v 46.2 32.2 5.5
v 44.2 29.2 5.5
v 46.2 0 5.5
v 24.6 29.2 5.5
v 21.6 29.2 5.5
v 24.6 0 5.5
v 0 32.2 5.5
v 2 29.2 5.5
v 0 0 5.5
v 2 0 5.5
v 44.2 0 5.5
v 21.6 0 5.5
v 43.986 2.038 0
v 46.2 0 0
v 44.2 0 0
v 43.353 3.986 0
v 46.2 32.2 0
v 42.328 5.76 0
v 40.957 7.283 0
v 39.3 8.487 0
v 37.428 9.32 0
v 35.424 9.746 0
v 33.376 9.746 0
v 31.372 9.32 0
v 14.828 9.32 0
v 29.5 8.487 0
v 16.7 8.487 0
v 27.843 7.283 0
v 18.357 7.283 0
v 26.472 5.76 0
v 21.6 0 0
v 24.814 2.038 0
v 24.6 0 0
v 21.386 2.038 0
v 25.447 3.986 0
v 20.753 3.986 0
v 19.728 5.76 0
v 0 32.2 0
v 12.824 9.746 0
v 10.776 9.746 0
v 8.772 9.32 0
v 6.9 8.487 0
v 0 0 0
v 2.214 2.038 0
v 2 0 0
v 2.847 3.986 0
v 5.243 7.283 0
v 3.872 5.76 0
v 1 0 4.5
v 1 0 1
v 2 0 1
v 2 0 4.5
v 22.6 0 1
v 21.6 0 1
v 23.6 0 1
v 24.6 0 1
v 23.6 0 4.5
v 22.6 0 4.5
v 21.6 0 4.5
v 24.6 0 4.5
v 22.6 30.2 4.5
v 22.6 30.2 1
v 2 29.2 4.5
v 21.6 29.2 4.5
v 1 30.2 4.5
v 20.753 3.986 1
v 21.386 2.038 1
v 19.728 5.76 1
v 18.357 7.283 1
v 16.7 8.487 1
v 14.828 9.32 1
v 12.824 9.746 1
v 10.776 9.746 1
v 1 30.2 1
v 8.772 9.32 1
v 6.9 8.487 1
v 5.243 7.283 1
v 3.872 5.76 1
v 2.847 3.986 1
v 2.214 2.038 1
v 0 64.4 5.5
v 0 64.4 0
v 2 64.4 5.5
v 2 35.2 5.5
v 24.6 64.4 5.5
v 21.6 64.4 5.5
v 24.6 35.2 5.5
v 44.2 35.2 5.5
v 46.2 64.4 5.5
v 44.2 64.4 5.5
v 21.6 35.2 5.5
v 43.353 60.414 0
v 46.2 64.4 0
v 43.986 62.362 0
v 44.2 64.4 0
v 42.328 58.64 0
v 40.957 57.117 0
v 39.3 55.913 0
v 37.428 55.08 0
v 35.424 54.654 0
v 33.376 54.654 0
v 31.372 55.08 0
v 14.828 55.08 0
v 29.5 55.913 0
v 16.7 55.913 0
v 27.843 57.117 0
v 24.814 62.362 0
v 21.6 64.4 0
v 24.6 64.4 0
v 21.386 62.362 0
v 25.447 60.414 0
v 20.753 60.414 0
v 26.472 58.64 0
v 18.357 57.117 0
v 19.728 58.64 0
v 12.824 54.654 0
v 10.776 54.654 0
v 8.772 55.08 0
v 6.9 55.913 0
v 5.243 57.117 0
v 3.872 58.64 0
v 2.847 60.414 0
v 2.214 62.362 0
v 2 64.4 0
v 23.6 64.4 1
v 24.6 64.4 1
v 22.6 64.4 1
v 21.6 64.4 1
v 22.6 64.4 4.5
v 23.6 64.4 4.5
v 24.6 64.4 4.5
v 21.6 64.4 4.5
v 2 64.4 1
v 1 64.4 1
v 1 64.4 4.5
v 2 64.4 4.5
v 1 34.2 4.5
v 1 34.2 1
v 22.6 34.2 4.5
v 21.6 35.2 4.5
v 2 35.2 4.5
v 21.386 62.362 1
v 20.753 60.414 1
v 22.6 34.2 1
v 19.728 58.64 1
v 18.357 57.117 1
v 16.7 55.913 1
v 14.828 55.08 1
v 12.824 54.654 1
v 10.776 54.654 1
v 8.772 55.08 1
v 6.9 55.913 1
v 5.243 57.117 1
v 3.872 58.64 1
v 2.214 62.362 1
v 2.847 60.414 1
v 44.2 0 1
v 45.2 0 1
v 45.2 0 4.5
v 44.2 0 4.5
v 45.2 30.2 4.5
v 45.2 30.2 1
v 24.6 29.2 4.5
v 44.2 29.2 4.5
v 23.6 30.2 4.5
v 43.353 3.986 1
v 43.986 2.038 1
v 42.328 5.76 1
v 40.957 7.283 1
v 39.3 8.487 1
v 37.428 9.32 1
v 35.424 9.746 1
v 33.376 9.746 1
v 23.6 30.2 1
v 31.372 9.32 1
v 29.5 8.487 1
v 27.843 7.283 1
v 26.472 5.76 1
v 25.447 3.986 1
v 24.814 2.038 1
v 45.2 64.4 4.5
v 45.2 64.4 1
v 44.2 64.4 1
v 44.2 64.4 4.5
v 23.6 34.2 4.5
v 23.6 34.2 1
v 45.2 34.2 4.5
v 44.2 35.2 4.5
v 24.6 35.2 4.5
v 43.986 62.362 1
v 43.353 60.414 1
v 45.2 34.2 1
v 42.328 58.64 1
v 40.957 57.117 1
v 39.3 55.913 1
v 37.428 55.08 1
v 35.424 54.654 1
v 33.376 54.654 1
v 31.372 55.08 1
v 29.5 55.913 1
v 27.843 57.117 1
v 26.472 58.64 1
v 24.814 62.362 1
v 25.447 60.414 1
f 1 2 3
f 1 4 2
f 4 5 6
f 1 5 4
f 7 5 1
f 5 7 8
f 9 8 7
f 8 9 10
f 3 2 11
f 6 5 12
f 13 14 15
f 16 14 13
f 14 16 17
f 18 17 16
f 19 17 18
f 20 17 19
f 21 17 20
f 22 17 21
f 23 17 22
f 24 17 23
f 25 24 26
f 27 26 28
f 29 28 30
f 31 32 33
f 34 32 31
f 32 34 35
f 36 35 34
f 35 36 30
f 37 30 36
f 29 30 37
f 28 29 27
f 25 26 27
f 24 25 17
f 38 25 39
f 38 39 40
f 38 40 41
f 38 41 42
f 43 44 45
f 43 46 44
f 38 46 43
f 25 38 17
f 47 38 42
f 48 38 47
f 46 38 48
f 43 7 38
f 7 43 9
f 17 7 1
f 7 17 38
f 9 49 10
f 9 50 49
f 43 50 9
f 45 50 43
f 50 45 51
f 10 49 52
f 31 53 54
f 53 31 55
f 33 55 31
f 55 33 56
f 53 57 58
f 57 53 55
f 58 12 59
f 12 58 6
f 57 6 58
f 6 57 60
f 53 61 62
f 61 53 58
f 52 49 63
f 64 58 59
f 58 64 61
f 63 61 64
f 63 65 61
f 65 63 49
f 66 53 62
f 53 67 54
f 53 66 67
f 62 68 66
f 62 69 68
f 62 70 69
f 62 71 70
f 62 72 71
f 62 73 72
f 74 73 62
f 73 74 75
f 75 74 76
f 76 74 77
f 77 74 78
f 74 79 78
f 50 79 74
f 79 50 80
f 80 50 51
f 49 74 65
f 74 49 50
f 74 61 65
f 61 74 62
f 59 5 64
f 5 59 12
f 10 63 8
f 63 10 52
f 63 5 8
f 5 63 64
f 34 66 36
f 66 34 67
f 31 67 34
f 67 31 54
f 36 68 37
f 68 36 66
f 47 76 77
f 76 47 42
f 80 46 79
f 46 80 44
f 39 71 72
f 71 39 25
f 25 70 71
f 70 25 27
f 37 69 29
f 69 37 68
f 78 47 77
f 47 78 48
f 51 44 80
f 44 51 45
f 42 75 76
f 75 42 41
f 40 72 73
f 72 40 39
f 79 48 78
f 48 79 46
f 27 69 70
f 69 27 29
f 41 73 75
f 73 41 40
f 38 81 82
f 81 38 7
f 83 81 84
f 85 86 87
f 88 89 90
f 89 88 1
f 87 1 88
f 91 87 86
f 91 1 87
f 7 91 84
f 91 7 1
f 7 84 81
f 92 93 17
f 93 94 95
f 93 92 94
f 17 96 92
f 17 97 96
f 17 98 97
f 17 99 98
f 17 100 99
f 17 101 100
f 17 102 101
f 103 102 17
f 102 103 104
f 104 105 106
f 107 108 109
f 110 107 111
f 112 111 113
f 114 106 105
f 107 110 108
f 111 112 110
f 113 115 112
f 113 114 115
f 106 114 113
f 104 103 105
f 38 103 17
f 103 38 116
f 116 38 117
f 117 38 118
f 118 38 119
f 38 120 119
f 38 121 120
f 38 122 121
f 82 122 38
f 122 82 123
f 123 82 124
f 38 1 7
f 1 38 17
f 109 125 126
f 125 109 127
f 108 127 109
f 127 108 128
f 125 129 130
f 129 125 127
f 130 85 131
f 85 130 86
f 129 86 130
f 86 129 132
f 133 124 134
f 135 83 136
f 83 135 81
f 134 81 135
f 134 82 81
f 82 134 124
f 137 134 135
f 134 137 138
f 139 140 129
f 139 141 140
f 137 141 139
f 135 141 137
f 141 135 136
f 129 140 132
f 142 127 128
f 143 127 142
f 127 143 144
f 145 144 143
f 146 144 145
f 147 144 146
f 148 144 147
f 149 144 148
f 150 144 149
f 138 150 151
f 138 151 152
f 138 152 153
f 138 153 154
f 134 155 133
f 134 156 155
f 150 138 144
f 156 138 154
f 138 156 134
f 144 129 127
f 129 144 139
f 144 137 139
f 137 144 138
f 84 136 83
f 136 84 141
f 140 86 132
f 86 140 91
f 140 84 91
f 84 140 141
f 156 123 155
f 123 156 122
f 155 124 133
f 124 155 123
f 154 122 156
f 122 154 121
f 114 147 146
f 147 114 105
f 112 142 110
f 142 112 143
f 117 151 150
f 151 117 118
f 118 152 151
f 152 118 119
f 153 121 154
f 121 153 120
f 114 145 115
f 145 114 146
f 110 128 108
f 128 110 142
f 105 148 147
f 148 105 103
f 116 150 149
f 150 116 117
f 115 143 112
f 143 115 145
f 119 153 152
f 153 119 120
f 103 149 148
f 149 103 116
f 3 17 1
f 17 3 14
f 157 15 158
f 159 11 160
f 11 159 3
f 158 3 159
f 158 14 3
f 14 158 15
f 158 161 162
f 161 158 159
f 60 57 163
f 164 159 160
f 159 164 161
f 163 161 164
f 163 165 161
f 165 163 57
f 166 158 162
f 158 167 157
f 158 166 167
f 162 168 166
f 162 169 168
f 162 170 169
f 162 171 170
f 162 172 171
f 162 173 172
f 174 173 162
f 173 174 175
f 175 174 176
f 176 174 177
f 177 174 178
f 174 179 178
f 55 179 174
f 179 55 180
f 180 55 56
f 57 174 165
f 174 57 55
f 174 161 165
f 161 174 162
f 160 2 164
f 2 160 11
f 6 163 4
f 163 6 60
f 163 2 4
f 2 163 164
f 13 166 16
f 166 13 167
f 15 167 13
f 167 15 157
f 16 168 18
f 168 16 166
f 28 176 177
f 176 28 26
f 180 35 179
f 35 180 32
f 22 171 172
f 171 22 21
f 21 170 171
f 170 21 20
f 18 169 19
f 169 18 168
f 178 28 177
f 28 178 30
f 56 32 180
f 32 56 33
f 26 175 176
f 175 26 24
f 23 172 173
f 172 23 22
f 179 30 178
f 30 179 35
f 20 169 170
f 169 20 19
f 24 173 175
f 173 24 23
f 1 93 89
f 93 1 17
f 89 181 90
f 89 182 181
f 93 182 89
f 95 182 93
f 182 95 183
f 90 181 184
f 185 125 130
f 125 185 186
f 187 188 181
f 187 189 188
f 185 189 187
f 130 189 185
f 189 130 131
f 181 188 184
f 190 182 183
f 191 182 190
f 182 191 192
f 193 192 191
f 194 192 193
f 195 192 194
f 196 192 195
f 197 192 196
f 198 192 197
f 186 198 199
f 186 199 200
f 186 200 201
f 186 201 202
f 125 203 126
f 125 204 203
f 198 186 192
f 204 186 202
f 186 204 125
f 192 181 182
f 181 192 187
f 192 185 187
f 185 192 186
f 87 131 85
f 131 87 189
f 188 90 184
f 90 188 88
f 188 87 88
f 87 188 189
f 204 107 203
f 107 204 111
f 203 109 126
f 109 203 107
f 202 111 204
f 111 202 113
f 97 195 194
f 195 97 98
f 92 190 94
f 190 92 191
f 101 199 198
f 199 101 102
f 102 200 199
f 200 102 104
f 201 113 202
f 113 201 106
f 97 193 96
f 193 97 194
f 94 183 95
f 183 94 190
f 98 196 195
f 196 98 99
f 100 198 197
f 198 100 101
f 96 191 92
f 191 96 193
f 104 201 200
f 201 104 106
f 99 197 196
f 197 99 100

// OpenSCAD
//unit is millimeter
mode = 1; //[1:holder,2:lid]
number = 2; //[1:10]
cartridgeWidth = 21.6; //[Hidden]
cartridgeLength = 31.2; //[Hidden]
cartridgeHeight = 3.5; //[Hidden]
gutter = 1; //[Hidden]

module lid() {
    translate([cartridgeHeight + gutter*4, 0, 0]) {
        rotate([0, -90, 0])
        difference() {
            difference(){
                cube([cartridgeWidth*number+gutter*(number+2), cartridgeLength*2 + gutter*5, cartridgeHeight + gutter*4]);
                translate([gutter, gutter, gutter])
                cube([cartridgeWidth*(number+1), cartridgeLength*2 + gutter*3, cartridgeHeight + gutter*2]);
            }
            
            translate([
                cartridgeWidth*number+gutter*(number+2),
                (cartridgeLength*2 + gutter*4)/2,
                -gutter
            ])
            cylinder(cartridgeHeight + gutter*6, cartridgeWidth/2 - gutter, cartridgeWidth/2 - gutter);
        }
    }
}
module holder() {
    difference() {
        difference() {
            difference() {    
                cube([cartridgeWidth + gutter * 2, cartridgeLength + gutter, cartridgeHeight + gutter*2]);
                translate([gutter, -gutter, gutter]) {
                    cube([cartridgeWidth, cartridgeLength, cartridgeHeight]);
                }
            }
            
            translate([gutter*2, -gutter, gutter]) {
                cube([cartridgeWidth - gutter * 2, cartridgeLength - gutter, cartridgeHeight + gutter*2]);
            }
        }
        
        translate([cartridgeWidth/2 + gutter , 0, -gutter/2]) {
            cylinder(gutter*2, cartridgeWidth/2 - gutter, cartridgeWidth/2 - gutter);
        }
    }
}


module block() {    
    holder();
    rotate([0, 0, 180])
    translate([-cartridgeWidth-gutter*2, -cartridgeLength*2-gutter*2, 0])
    holder();
}



module holderBlock() {
    for (i = [1:1:number]) {
        translate([cartridgeWidth*(i-1)+gutter*(i-1), 0, 0])
        block();
    }
}

if (mode == 1){
    holderBlock();
} else {    
    lid();
}
